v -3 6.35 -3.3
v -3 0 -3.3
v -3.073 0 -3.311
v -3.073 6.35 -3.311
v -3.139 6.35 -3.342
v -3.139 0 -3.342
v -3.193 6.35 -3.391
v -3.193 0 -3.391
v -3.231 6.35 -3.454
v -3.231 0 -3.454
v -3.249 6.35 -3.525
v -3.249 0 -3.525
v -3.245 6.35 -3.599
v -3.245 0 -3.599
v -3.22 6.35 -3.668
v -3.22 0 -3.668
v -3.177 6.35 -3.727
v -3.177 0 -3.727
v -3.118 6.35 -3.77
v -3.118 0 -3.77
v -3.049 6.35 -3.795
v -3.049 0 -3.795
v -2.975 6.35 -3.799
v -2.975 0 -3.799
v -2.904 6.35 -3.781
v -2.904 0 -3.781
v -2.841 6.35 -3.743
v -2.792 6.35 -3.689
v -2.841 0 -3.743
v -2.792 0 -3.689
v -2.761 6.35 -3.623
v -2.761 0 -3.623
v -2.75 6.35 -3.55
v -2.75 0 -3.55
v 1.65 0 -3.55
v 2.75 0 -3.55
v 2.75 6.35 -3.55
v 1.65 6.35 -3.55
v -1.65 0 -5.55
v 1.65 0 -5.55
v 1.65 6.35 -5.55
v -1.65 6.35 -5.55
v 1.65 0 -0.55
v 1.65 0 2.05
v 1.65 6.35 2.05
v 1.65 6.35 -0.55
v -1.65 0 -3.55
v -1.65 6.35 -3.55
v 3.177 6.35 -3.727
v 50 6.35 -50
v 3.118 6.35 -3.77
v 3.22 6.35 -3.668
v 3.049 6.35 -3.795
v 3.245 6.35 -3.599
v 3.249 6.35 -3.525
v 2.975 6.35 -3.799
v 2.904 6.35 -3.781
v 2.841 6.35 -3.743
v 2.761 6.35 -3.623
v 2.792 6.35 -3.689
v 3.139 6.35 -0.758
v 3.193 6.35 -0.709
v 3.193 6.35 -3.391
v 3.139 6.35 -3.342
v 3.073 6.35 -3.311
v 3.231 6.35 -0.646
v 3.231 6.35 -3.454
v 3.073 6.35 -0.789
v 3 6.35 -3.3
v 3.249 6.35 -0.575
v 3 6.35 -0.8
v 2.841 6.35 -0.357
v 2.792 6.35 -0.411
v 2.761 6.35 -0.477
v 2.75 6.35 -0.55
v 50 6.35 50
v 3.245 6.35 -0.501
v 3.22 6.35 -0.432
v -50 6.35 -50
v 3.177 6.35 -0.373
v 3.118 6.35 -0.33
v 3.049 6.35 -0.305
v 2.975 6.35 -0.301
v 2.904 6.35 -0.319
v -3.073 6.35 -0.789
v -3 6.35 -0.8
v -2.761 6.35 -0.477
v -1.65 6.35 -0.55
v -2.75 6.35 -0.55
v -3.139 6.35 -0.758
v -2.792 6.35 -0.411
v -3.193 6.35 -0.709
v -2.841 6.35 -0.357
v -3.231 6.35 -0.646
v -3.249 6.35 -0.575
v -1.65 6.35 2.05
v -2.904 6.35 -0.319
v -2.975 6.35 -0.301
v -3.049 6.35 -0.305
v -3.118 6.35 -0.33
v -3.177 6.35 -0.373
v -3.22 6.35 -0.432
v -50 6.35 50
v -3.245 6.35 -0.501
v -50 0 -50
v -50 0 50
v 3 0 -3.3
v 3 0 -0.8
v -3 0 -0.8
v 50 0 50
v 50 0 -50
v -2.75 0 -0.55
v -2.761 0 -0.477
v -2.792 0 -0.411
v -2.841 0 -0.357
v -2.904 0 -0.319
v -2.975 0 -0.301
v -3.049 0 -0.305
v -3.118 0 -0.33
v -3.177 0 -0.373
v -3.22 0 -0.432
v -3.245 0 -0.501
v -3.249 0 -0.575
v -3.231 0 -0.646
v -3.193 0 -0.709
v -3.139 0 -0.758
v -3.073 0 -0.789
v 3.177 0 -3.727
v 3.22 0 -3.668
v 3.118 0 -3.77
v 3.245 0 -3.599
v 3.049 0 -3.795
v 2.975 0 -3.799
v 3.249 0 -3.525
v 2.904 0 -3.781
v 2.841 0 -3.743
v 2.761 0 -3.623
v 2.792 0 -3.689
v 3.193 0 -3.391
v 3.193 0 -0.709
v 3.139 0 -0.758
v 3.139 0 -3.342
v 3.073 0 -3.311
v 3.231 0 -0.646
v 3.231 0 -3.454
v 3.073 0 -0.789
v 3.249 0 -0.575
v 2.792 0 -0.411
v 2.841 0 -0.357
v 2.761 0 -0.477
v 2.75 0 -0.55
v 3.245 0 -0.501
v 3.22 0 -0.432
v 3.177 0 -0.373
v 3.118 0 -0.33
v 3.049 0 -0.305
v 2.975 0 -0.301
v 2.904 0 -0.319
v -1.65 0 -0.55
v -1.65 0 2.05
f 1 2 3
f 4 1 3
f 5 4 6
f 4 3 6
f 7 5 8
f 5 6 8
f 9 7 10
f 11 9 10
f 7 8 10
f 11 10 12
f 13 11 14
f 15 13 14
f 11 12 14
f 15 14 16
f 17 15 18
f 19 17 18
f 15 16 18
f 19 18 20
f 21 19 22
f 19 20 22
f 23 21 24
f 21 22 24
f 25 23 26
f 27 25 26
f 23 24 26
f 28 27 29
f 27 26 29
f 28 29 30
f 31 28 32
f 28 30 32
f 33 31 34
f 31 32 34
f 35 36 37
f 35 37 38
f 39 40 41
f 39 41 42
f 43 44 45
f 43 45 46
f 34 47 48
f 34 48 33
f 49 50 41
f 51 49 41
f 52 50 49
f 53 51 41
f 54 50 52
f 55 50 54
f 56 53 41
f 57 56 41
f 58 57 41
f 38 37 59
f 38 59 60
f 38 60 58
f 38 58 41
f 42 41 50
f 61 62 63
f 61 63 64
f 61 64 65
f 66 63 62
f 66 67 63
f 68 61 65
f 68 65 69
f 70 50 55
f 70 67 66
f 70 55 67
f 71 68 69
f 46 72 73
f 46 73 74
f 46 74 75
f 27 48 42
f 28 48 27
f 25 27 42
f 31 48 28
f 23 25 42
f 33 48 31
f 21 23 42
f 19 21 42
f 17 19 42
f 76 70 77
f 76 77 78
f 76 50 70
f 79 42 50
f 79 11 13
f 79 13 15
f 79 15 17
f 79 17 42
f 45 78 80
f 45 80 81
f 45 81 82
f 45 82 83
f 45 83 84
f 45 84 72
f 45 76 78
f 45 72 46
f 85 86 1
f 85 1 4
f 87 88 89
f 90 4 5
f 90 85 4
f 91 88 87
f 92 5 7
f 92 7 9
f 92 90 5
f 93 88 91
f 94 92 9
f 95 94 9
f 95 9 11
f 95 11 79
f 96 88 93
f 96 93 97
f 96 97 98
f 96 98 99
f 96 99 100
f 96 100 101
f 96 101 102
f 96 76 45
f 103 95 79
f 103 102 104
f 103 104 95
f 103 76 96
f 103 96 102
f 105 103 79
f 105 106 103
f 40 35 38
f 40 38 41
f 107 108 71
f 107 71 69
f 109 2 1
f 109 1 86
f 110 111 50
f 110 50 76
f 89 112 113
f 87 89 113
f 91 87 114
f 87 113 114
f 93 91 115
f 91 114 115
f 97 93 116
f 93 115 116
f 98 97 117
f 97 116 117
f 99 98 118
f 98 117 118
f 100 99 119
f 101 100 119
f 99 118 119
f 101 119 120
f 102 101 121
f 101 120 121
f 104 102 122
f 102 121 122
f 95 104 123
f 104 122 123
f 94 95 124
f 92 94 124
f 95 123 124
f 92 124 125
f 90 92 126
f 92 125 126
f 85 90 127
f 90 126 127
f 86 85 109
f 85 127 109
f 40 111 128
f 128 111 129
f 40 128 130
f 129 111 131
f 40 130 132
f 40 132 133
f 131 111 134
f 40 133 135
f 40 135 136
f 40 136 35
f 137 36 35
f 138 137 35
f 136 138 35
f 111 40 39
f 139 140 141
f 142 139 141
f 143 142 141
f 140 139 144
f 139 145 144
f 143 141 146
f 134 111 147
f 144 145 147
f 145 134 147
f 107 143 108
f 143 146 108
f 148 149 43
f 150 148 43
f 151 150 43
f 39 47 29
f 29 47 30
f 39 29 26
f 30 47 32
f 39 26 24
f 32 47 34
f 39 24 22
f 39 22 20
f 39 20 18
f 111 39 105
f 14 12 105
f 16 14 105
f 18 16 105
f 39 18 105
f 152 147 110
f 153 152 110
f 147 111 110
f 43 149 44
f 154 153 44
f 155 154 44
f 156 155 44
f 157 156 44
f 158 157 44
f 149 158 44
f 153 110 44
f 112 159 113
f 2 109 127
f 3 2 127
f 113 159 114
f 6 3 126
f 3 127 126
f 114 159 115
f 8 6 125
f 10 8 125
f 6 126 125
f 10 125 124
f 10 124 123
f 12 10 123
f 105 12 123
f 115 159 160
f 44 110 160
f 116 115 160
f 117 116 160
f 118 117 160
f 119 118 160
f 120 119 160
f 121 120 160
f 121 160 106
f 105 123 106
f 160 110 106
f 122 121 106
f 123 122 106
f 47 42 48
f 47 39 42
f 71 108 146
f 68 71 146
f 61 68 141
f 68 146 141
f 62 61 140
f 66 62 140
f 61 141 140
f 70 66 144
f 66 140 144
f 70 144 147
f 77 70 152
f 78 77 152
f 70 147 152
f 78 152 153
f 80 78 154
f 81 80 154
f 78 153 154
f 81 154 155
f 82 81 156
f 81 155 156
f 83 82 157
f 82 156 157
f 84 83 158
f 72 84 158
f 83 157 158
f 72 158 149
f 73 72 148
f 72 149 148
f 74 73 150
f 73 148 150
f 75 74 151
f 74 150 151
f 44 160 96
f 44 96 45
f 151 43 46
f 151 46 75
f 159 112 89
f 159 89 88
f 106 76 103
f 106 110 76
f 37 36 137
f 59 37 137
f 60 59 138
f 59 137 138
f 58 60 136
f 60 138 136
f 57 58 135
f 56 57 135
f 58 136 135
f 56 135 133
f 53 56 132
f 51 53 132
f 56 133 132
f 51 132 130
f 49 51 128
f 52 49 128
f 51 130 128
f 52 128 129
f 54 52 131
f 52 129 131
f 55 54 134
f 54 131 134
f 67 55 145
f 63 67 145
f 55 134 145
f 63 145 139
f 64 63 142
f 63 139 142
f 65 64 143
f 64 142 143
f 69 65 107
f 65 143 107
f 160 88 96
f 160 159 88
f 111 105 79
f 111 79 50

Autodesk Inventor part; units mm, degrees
ref_plane "YZ Plane" through (0, 0, 0) normal (1, 0, 0) x (0, 1, 0)
ref_plane "XZ Plane" through (0, 0, 0) normal (0, 1, 0) x (-1, 0, 0)
ref_plane "XY Plane" through (0, 0, 0) normal (0, 0, 1) x (1, 0, 0)
sketch "Sketch1" plane through (0, 0, 0) normal (0, 1, 0) x (-1, 0, 0)
  line L0 (50, -50) -> (-50, -50)
  line L1 (-50, -50) -> (-50, 50)
  line L2 (-50, 50) -> (50, 50)
  line L3 (50, 50) -> (50, -50)
  line L4 (50, -50) -> (-50, 50) construction
  line L5 (-50, -50) -> (50, 50) construction
  point P0 (0, 0)
  dimension "d0" = 100
  dimension "d1" = 100
extrude "Extrusion1" add sketch "Sketch1" along normal blind 6.35
sketch "Sketch7" plane through (0, 0, 0) normal (0, -1, 0) x (1, 0, 0)
  line L0 (1.65, -2.05) -> (-1.65, -2.05)
  line L1 (-1.65, -2.05) -> (-1.65, 2.05)
  line L2 (-1.65, 2.05) -> (1.65, 2.05)
  line L3 (1.65, 2.05) -> (1.65, -2.05)
  line L4 (1.65, -2.05) -> (-1.65, 2.05) construction
  line L5 (-1.65, -2.05) -> (1.65, 2.05) construction
  line L6 (3, -3.55) -> (-3, -3.55)
  line L7 (-3, -3.55) -> (-3, -0.55)
  line L8 (-3, -0.55) -> (3, -0.55)
  line L9 (3, -0.55) -> (3, -3.55)
  line L10 (3, -3.55) -> (-3, -0.55) construction
  line L11 (-3, -3.55) -> (3, -0.55) construction
  circle A0 centre (-3, -0.55) radius 0.25
  circle A1 centre (3, -0.55) radius 0.25
  circle A2 centre (3, -3.55) radius 0.25
  circle A3 centre (-3, -3.55) radius 0.25
  line L12 (-1.65, -2.05) -> (1.65, -2.05)
  line L13 (1.65, -2.05) -> (1.65, -3.55)
  line L14 (1.65, -3.55) -> (-1.65, -3.55)
  line L15 (-1.65, -3.55) -> (-1.65, -2.05)
  line L16 (-1.65, -3.55) -> (1.65, -3.55)
  line L17 (1.65, -3.55) -> (1.65, -5.55)
  line L18 (1.65, -5.55) -> (-1.65, -5.55)
  line L19 (-1.65, -5.55) -> (-1.65, -3.55)
  point P0 (0, 0)
  point P1 (0, -2.05)
  dimension "d49" = 5.6
  dimension "d50" = 3.3
  dimension "d51" = 6
  dimension "d52" = 3
  dimension "d55" = 0.5
  dimension "d56" = 0.5
  dimension "d57" = 0.5
  dimension "d58" = 0.5
  dimension "d59" = 2
extrude "Extrusion7" cut sketch "Sketch7" against normal up to next
sketch "Sketch6" plane through (0, 0, 0) normal (0, -1, 0) x (1, 0, 0)
  line L0 (-50, -50) -> (50, -50) projected
  line L1 (50, 50) -> (-50, 50) projected
  line L2 (1.65, 45.9) -> (-1.65, 45.9)
  line L3 (-1.65, 45.9) -> (-1.65, 50)
  line L4 (-1.65, 50) -> (1.65, 50)
  line L5 (1.65, 50) -> (1.65, 45.9)
  line L6 (1.65, 45.9) -> (-1.65, 50) construction
  line L7 (-1.65, 45.9) -> (1.65, 50) construction
  line L8 (3, 44.4) -> (-3, 44.4)
  line L9 (-3, 44.4) -> (-3, 47.4)
  line L10 (-3, 47.4) -> (3, 47.4)
  line L11 (3, 47.4) -> (3, 44.4)
  line L12 (3, 44.4) -> (-3, 47.4) construction
  line L13 (-3, 44.4) -> (3, 47.4) construction
  line L14 (20.8795, -44.4) -> (-20.8795, -44.4)
  line L15 (-20.8795, -44.4) -> (-20.8795, 44.4)
  line L16 (-20.8795, 44.4) -> (20.8795, 44.4)
  line L17 (20.8795, 44.4) -> (20.8795, -44.4)
  line L18 (20.8795, -44.4) -> (-20.8795, 44.4) construction
  line L19 (-20.8795, -44.4) -> (20.8795, 44.4) construction
  line L20 (0, 44.4) -> (0, -44.4)
  point P0 (0, 0)
  point P1 (0, 47.95)
  point P2 (0, 45.9)
  dimension "d43" = 5.6
  dimension "d44" = 3
  dimension "d45" = 6
  dimension "d46" = 3.3
sketch "Sketch5" plane through (0, 6.35, 0) normal (0, 1, 0) x (1, 0, 0)
  line L0 (50, 50) -> (-50, 50) projected
  line L1 (1.65, 50) -> (0, 50)
  line L2 (0, 50) -> (0, 0)
  line L3 (0, 0) -> (1.65, 0)
  line L4 (1.65, 0) -> (1.65, 50)
  line L5 (0, 0) -> (-1.65, 0)
  line L6 (-1.65, 0) -> (-1.65, 50)
  line L7 (-1.65, 50) -> (0, 50)
  line L8 (0, 50) -> (0, 0)
  line L9 (-1.65, 44.4) -> (1.65, 44.4)
  line L10 (3, 44.4) -> (-3, 44.4)
  line L11 (-3, 44.4) -> (-3, 47.4)
  line L12 (-3, 47.4) -> (3, 47.4)
  line L13 (3, 47.4) -> (3, 44.4)
  dimension "d36" = 3.3
  dimension "d37" = 5.6
  dimension "d38" = 6
  dimension "d39" = 3
  dimension "d40" = 0
equation "\"d49\" = screw_length - m2_thickness"
equation "\"d50\" = screw_width"
equation "\"d51\" = nut_width"
equation "\"d52\" = nut_thickness"
equation "\"d55\" = relief"
equation "\"d56\" = relief"
equation "\"d57\" = relief"
equation "\"d58\" = relief"
equation "\"d59\" = extra_screw"
equation "\"d43\" = screw_length - m2_thickness"
equation "\"d44\" = nut_thickness"
equation "\"d45\" = nut_width"
equation "\"d46\" = screw_width"
equation "\"d36\" = screw_width"
equation "\"d37\" = screw_length - m2_thickness"
equation "\"d38\" = nut_width"
equation "\"d39\" = nut_thickness"
equation "\"m2_thickness\" = 6.4"
equation "\"screw_length\" = 12"
equation "\"nut_width\" = 6"
equation "\"nut_thickness\" = 3"
equation "\"screw_width\" = 3.3"
equation "\"relief\" = 0.5"
equation "\"extra_screw\" = 2"
properties part number "screwlockgen"
